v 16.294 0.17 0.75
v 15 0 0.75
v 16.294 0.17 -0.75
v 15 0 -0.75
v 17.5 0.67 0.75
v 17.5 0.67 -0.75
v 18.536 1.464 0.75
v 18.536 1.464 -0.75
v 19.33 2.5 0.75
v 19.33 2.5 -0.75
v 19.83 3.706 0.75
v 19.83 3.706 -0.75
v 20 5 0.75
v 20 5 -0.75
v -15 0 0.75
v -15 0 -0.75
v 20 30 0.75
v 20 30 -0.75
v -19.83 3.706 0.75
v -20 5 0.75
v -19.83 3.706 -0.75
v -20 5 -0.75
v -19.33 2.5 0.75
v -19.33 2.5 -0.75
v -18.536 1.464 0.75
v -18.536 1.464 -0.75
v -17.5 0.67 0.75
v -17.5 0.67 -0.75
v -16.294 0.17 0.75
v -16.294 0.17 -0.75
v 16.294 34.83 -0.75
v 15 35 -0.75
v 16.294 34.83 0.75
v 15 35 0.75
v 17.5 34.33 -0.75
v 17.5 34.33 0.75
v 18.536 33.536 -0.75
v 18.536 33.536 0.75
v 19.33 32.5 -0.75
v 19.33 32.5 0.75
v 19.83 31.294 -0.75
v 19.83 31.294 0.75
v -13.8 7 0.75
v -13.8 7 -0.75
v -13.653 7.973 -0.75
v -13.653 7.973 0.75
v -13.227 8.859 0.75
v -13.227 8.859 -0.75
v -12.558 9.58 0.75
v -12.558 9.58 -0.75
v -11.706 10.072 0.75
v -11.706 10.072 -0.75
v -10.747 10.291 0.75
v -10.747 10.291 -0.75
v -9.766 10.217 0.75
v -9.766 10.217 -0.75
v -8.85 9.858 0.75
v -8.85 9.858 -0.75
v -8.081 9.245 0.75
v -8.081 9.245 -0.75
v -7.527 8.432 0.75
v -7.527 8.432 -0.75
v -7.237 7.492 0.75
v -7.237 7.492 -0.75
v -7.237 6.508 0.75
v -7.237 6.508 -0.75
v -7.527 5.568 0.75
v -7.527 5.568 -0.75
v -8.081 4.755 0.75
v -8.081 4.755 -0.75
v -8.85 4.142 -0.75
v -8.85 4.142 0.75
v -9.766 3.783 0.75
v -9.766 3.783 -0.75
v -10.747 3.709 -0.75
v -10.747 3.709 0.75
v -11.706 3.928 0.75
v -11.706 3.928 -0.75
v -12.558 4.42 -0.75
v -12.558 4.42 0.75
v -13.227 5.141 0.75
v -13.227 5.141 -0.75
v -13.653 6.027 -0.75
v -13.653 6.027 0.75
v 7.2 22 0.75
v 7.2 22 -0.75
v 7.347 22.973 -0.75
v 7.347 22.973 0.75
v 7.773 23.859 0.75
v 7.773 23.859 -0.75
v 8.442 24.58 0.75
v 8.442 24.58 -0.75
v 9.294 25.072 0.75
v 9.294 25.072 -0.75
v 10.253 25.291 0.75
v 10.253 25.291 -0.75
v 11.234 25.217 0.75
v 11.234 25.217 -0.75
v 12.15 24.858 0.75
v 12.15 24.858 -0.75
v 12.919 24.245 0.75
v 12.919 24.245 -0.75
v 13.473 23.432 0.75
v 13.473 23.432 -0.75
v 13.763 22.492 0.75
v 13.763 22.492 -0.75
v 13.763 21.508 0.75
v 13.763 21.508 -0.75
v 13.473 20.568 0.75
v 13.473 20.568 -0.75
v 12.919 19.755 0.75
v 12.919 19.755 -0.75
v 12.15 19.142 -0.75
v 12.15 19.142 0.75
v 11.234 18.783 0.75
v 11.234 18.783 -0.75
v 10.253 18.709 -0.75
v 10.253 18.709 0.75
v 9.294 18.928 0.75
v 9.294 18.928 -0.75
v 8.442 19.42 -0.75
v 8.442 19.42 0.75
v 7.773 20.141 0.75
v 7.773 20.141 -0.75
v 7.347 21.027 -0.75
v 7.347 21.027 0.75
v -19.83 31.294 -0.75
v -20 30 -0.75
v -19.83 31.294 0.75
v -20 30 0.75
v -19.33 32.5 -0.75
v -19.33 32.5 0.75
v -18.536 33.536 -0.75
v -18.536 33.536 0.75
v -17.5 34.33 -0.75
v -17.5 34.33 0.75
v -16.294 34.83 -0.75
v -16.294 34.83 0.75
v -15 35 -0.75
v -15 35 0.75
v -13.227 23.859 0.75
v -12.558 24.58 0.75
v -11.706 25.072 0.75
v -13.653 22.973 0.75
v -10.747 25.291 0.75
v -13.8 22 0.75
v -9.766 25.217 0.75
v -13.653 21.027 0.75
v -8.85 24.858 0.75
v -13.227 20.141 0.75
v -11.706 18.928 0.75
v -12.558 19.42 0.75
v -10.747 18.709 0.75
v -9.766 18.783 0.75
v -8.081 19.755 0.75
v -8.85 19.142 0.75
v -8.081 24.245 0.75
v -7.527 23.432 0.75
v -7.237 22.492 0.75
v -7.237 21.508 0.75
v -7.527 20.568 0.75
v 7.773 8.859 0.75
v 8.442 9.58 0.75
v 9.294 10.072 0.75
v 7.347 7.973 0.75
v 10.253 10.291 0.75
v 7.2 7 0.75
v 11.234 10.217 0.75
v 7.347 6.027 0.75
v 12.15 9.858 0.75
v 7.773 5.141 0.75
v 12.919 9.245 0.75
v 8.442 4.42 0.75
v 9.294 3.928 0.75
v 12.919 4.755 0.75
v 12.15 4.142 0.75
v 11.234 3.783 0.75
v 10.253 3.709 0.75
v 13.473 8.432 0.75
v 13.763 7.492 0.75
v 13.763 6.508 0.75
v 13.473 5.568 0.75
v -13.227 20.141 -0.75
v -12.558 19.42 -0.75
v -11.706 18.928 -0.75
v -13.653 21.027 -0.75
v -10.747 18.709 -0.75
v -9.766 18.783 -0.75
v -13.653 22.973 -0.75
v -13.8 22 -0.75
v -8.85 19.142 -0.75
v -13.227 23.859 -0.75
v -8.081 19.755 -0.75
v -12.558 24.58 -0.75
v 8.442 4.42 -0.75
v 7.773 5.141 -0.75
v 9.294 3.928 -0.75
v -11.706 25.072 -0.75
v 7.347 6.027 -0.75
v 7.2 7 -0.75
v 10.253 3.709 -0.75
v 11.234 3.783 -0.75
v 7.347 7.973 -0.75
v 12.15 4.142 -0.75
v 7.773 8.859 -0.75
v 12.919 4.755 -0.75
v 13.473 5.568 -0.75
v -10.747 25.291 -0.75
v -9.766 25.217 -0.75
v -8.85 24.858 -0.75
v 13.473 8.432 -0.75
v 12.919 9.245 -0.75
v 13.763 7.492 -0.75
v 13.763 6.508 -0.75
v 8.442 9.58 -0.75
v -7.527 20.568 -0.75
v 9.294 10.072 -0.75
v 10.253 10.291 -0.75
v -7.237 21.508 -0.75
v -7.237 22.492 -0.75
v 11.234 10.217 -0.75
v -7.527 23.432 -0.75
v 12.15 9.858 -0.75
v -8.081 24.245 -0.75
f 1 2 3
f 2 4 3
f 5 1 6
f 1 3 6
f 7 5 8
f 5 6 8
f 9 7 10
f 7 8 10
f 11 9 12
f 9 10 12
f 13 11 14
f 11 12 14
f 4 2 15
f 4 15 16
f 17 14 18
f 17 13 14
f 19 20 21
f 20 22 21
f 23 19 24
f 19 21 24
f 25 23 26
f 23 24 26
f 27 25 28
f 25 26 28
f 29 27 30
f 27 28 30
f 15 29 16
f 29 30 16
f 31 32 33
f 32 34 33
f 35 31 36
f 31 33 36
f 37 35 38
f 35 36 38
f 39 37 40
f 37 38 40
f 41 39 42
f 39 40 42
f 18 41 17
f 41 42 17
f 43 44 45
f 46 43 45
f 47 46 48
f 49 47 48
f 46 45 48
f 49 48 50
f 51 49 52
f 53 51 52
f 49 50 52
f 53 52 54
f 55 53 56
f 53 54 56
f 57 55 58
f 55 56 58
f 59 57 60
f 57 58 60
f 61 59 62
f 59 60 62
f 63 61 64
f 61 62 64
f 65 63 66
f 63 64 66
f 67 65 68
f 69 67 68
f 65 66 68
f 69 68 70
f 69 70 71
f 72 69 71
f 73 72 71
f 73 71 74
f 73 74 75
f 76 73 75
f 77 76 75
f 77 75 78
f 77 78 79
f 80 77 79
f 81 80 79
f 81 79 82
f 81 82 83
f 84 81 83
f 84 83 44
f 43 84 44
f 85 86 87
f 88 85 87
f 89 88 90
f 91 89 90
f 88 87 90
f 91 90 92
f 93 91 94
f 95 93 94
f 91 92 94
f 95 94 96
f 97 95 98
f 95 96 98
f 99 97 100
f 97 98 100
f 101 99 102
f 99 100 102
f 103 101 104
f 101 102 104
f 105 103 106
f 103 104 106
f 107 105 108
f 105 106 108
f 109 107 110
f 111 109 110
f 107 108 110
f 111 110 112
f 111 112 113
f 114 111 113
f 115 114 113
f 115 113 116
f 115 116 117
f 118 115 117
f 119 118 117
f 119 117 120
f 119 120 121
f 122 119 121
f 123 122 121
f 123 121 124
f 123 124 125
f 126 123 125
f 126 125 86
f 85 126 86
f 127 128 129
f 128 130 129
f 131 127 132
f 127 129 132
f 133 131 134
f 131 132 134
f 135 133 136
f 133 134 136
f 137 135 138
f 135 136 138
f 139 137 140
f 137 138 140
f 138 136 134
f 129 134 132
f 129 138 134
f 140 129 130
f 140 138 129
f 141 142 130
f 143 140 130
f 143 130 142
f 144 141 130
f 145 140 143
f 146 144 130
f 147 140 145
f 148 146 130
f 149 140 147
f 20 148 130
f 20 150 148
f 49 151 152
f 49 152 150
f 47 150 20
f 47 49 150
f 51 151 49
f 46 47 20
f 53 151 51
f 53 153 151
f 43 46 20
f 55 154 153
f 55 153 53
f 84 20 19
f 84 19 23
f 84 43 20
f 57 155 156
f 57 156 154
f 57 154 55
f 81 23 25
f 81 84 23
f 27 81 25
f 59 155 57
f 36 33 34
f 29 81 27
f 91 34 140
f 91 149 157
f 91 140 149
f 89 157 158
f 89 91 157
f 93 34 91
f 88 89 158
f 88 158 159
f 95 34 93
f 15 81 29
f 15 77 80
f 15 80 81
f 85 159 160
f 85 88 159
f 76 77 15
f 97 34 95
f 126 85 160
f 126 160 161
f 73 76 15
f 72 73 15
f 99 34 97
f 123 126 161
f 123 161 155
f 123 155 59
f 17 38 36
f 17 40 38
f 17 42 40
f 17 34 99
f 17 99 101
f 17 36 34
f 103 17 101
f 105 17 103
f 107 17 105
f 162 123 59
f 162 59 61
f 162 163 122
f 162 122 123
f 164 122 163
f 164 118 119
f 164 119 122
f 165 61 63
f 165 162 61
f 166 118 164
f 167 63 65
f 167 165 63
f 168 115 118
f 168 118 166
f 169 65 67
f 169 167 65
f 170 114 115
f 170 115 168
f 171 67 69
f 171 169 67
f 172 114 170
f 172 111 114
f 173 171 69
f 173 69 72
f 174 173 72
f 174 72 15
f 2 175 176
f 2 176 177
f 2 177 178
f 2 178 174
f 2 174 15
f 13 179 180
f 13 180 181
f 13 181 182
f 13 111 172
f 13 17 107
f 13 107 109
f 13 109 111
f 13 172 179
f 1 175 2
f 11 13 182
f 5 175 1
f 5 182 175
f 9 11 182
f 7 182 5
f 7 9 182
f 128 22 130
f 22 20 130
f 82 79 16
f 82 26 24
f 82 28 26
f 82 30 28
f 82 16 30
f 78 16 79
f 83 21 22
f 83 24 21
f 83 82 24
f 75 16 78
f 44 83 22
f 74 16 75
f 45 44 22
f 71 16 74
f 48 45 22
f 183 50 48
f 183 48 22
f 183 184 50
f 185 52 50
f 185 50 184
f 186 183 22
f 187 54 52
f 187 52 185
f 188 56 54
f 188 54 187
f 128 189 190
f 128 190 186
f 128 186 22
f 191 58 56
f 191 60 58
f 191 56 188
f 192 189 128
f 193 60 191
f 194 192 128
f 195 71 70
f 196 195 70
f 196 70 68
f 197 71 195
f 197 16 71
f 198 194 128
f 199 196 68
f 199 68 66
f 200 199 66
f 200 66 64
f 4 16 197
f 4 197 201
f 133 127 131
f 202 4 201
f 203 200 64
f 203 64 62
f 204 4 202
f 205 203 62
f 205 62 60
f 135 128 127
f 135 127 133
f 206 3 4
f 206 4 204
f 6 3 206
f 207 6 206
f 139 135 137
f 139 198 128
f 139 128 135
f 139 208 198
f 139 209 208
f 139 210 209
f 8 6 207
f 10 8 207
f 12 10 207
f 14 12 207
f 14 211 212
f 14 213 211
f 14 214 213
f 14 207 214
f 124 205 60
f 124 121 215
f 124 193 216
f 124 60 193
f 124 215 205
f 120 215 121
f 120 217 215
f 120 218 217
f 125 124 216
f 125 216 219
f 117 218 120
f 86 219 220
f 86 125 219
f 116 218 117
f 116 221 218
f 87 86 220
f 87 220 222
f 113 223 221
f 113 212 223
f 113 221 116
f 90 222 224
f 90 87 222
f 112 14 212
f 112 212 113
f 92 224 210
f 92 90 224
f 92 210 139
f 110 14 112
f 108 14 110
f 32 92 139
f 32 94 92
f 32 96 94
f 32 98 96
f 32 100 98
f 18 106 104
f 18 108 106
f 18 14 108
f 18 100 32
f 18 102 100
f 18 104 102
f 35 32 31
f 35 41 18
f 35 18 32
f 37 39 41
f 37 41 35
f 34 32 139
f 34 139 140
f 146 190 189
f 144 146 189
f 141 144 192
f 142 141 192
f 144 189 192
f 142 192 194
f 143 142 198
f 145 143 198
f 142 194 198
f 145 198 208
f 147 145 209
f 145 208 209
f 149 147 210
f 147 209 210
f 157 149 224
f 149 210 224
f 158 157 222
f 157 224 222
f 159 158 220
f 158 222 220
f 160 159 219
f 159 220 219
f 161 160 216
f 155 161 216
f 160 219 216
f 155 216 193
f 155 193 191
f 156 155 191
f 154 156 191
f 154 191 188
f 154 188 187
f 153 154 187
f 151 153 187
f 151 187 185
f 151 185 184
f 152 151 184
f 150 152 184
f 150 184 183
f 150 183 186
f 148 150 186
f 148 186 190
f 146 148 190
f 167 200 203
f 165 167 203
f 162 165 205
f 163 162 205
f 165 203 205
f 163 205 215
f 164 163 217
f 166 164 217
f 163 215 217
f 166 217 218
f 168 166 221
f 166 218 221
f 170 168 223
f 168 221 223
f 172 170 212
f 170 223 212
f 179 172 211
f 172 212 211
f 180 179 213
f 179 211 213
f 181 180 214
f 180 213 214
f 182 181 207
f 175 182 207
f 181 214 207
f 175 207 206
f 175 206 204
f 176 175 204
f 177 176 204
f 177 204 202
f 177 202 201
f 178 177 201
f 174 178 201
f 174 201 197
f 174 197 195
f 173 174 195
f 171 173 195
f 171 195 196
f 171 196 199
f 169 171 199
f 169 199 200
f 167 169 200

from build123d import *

# Parameters (mm, degrees)
F1_DEPTH = 20
F3_D     = 6.6
F3_DEPTH = 43
F3_TIP   = 1.9828400428
F4_R     = 5


with BuildPart() as f1:
    # F0 (on Right) → F1 (new body, symmetric)
    with BuildSketch(Plane.YZ):
        Polygon((0, 0), (0, -0.75), (35, -0.75), (35, 0.75), (0, 0.75), align=None)
    extrude(amount=F1_DEPTH, both=True)

    # F3
    with Locations(Plane.XY.offset(0.75)):
        with Locations((-10.5, 7), (10.5, 7), (10.5, 22), (-10.5, 22)):
            Hole(F3_D / 2, depth=F3_DEPTH)
            with Locations((0, 0, -(F3_DEPTH + F3_TIP / 2))):  # 118° drill point
                Cone(0, F3_D / 2, F3_TIP, mode=Mode.SUBTRACT)

    # F4
    f4_edges = [f1.edges().sort_by_distance(p)[0] for p in [
        (20, 0, 0),
        (-20, 0, 0),
        (20, 35, 0),
        (-20, 35, 0),
    ]]
    fillet(f4_edges, radius=F4_R)


solid = f1.part
